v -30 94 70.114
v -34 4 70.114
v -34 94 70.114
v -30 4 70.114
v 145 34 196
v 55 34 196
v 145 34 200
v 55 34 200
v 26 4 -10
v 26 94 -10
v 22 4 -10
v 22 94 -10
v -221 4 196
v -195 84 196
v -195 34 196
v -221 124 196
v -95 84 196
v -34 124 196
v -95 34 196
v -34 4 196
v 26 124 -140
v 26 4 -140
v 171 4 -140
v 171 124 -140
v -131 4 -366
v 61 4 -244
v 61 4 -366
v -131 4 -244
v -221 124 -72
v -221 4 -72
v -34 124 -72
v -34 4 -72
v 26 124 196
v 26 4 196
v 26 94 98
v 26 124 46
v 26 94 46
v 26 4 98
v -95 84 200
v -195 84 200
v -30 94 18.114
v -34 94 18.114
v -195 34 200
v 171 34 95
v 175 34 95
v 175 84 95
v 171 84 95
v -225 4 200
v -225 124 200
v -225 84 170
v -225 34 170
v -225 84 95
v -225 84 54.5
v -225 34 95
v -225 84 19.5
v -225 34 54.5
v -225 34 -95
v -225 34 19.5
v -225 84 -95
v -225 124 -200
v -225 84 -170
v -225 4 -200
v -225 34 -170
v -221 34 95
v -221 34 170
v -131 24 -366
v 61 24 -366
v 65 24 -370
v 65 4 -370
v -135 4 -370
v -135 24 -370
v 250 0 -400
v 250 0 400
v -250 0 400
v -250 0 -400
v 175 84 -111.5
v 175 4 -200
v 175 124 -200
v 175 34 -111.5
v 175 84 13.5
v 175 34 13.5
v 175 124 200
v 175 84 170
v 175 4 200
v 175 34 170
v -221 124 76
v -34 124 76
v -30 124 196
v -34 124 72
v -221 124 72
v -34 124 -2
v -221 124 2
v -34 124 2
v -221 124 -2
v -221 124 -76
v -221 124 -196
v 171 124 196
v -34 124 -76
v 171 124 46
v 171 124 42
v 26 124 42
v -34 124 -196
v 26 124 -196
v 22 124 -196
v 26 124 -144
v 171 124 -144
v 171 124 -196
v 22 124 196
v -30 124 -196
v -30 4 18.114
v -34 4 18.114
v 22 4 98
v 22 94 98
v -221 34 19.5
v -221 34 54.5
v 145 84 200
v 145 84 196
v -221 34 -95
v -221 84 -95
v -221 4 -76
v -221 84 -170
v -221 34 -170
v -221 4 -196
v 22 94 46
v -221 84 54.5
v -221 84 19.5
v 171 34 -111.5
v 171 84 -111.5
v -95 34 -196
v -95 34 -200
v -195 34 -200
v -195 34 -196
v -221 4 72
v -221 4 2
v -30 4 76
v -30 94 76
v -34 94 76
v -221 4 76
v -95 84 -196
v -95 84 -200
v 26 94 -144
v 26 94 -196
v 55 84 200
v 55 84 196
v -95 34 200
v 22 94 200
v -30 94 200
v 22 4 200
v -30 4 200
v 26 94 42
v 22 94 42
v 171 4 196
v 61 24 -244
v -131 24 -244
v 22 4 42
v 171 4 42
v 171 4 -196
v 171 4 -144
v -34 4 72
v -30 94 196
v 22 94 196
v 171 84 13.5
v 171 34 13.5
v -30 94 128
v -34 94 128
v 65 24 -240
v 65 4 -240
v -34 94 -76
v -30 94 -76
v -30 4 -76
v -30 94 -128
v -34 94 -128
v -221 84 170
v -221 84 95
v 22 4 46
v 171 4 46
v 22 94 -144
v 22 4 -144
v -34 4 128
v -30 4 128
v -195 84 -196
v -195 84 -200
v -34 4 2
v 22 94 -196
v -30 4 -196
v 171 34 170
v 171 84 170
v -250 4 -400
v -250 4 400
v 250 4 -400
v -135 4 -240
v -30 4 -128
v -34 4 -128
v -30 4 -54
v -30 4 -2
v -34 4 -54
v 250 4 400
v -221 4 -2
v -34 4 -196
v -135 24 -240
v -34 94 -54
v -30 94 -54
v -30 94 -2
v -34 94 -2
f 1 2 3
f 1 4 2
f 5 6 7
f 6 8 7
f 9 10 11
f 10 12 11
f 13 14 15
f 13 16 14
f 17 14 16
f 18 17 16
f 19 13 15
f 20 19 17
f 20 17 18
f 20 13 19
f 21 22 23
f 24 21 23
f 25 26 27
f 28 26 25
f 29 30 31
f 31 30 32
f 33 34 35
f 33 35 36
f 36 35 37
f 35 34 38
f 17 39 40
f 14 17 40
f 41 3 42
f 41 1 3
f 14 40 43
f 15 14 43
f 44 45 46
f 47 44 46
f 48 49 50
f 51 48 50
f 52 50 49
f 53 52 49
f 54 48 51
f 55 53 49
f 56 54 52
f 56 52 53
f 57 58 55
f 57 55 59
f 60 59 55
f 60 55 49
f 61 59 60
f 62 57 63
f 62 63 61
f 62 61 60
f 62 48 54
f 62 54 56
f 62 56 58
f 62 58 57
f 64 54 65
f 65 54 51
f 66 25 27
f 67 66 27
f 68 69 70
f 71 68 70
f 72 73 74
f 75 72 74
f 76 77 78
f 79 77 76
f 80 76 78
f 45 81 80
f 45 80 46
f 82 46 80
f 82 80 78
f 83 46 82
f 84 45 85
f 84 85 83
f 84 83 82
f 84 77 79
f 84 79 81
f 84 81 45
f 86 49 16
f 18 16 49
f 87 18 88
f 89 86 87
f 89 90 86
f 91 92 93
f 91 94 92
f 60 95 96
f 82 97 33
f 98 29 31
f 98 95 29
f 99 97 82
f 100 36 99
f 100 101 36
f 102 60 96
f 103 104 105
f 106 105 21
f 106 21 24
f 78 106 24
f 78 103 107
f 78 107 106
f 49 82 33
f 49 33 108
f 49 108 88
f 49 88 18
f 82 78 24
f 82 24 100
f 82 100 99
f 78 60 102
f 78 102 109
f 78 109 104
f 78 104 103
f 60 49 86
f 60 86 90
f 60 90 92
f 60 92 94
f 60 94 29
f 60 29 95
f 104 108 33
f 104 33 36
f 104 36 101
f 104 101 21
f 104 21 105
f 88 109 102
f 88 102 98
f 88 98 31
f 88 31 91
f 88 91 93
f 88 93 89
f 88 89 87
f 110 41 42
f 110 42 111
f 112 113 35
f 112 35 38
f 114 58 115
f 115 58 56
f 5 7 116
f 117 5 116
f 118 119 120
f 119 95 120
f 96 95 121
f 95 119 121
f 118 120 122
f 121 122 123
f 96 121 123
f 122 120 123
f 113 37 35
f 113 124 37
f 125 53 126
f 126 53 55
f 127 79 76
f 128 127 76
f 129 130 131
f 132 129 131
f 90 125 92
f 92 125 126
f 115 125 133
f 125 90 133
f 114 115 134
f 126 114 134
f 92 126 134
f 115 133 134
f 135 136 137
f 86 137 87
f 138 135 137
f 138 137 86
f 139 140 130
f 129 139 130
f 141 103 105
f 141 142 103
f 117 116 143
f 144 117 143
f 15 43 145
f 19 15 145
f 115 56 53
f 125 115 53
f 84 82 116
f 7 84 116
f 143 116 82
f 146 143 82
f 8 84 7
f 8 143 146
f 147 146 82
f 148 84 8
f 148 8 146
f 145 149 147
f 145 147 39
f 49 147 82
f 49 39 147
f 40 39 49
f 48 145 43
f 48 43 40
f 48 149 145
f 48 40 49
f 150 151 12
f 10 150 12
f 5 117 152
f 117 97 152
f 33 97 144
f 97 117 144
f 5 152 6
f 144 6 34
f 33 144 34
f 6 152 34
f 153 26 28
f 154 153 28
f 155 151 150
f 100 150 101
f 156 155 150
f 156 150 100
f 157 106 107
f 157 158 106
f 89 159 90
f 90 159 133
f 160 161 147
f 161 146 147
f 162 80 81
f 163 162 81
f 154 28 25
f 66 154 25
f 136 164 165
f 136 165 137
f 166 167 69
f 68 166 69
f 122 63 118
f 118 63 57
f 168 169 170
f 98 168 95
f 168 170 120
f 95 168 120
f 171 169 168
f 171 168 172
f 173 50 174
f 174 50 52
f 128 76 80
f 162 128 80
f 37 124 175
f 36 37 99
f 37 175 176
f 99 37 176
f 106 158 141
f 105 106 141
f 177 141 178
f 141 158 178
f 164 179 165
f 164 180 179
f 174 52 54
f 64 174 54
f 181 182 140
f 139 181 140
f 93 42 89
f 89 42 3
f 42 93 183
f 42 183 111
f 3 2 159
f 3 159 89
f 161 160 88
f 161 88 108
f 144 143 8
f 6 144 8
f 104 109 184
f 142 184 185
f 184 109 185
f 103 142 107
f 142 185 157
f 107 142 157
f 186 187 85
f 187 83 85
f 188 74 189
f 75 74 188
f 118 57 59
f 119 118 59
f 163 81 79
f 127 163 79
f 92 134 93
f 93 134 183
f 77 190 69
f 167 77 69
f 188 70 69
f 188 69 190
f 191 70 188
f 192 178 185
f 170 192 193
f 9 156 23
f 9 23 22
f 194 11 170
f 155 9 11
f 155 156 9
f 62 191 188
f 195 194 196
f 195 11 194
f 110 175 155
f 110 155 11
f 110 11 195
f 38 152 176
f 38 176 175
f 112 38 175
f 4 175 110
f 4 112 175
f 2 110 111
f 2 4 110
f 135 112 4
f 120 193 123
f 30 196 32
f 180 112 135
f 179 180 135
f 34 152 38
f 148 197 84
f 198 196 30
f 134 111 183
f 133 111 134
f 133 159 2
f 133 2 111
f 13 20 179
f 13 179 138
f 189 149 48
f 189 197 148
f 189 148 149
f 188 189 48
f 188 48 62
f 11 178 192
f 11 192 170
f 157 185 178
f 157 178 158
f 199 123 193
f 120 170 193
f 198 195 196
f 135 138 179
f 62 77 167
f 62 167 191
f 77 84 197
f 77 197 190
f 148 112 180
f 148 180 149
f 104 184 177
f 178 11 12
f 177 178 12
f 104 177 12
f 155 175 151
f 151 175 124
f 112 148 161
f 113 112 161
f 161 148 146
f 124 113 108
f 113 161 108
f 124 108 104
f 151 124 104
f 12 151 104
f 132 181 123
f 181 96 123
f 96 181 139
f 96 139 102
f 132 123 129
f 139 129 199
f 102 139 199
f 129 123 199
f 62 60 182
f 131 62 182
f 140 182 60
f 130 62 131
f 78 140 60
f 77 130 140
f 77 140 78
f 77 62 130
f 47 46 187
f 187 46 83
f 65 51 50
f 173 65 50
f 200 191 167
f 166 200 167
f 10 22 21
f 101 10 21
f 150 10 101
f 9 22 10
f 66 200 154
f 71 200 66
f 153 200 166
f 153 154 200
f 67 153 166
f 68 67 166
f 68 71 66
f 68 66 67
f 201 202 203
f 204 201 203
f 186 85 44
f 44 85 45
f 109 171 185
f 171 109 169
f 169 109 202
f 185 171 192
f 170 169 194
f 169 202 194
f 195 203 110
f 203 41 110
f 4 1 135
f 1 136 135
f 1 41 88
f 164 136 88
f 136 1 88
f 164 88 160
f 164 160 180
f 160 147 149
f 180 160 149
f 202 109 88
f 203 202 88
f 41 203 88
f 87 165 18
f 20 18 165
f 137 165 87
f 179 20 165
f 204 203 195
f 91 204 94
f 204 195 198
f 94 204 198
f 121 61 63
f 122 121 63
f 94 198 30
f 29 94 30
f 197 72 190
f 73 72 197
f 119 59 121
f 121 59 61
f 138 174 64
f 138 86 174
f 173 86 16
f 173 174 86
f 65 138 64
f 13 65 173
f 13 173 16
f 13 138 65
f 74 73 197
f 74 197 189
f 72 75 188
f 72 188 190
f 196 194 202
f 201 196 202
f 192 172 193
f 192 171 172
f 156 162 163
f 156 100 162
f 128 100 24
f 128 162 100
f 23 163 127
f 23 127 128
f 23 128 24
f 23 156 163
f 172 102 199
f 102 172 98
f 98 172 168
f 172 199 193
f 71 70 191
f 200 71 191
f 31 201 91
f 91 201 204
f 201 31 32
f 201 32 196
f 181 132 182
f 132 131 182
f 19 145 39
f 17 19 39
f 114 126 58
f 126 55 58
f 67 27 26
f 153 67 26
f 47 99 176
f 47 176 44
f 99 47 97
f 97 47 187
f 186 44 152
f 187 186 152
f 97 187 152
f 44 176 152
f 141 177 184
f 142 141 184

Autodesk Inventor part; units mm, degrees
ref_plane "YZ Plane" through (0, 0, 0) normal (1, 0, 0) x (0, 1, 0)
sketch "Boceto1" plane through (0, 0, 0) normal (0, 1, 0) x (-1, 0, 0)
  line L0 (-250, 400) -> (250, 400)
  line L1 (250, 400) -> (250, -400)
  line L2 (250, -400) -> (-250, -400)
  line L3 (-250, -400) -> (-250, 400)
  line L4 (-250, 400) -> (250, -400) construction
  line L5 (250, 400) -> (-250, -400) construction
  line L6 (-175, 200) -> (225, 200)
  line L7 (225, 200) -> (225, -200)
  line L8 (225, -200) -> (-175, -200)
  line L9 (-175, -200) -> (-175, 200)
  line L10 (-175, 200) -> (225, -200) construction
  line L11 (225, 200) -> (-175, -200) construction
  point P0 (0, 0)
  point P1 (25, 0)
  dimension "d0" = 500
  dimension "d1" = 800
  dimension "d4" = 400
  dimension "d5" = 400
  dimension "d6" = 200
  dimension "d7" = 75
extrude "Extrusión1" add sketch "Boceto1" along normal blind 4 contours L0 L1 L2 L3 | L6 L7 L8 L9
sketch "Boceto2" plane through (0, 4, 0) normal (0, 1, 0) x (1, 0, 0)
  line L0 (175, -200) -> (-225, -200)
  line L1 (-225, -200) -> (-225, 200)
  line L2 (-225, 200) -> (175, 200)
  line L3 (175, 200) -> (175, -200)
  line L4 (175, -200) -> (-225, 200) construction
  line L5 (-225, -200) -> (175, 200) construction
  line L6 (250, -400) -> (250, 400) projected
  line L7 (250, 400) -> (-250, 400) projected
  line L8 (-221, -196) -> (-34, -196)
  line L9 (-34, -196) -> (-34, -76)
  line L10 (-34, -76) -> (-221, -76)
  line L11 (-221, -76) -> (-221, -196)
  line L12 (171, -196) -> (26, -196)
  line L13 (26, -196) -> (26, -46)
  line L14 (26, -46) -> (171, -46)
  line L15 (171, -46) -> (171, -196)
  line L16 (171, 196) -> (26, 196)
  line L17 (26, 196) -> (26, -42)
  line L18 (26, -42) -> (171, -42)
  line L19 (171, -42) -> (171, 196)
  line L20 (-34, -72) -> (-221, -72)
  line L21 (-221, -72) -> (-221, 72)
  line L22 (-221, 72) -> (-34, 72)
  line L23 (-34, 72) -> (-34, -72)
  line L24 (-34, 76) -> (-221, 76)
  line L25 (-221, 76) -> (-221, 196)
  line L26 (-221, 196) -> (-34, 196)
  line L27 (-34, 196) -> (-34, 76)
  line L28 (-30, 196) -> (22, 196)
  line L29 (22, 196) -> (22, 122)
  line L30 (-30, 122) -> (-30, 196)
  line L31 (-34, 0) -> (-34, -2)
  line L32 (-34, -2) -> (-34, 2)
  line L33 (-34, 2) -> (-221, 2)
  line L34 (-221, -2) -> (-34, -2)
  line L35 (-30, -200) -> (-30, 122)
  line L36 (22, 122) -> (22, -200)
  line L37 (-30, -196) -> (22, -196)
  line L38 (26, 196) -> (26, 144)
  line L39 (26, 144) -> (26, 140)
  line L40 (26, 140) -> (171, 140)
  line L41 (171, 144) -> (26, 144)
  point P0 (0, 0)
  point P1 (-25, 0)
  point P2 (-30, 126)
  point P3 (22, 126)
  dimension "d8" = 400
  dimension "d9" = 400
  dimension "d10" = 75
  dimension "d11" = 200
  dimension "d12" = 4
  dimension "d13" = 4
  dimension "d14" = 4
  dimension "d15" = 4
  dimension "d16" = 4
  dimension "d17" = 60
  dimension "d18" = 145
  dimension "d19" = 150
  dimension "d20" = 120
  dimension "d21" = 120
  dimension "d22" = 4
  dimension "d23" = 4
  dimension "d24" = 2
  dimension "d25" = 4
  dimension "d27" = 4
  dimension "d39" = 52
  dimension "d40" = 4
ref_plane "Plano de trabajo1" through (-225, 4, 200) normal (0, 0, 1) x (1, 0, 0)
sketch "Boceto3" plane through (-225, 4, 200) normal (0, 0, 1) x (1, 0, 0)
  line L0 (195, 0) -> (195, 120) projected
  line L1 (247, 0) -> (247, 120) projected
  line L2 (195, 0) -> (247, 0)
  line L3 (247, 0) -> (247, 90)
  line L4 (247, 90) -> (195, 90)
  line L5 (195, 90) -> (195, 0)
  point P0 (225, -4)
  dimension "d31" = 90
extrude "Extrusión3" cut sketch "Boceto3" against normal blind 120
ref_plane "Plano de trabajo2" through (-30, 4, 200) normal (1, 0, 0) x (0, 0, -1)
sketch "Boceto4" plane through (-30, 4, 200) normal (1, 0, 0) x (0, 0, -1)
  line L0 (124, 0) -> (124, 120) projected
  line L1 (124, 0) -> (72, 0)
  line L2 (72, 0) -> (72, 90)
  line L3 (72, 90) -> (124, 90)
  line L4 (124, 90) -> (124, 0)
  line L5 (0, 0) -> (400, 0) projected
  line L6 (129.886, 90) -> (181.886, 90)
  line L7 (181.886, 90) -> (181.886, 0)
  line L8 (181.886, 0) -> (129.886, 0)
  line L9 (129.886, 0) -> (129.886, 90)
  line L10 (202, 0) -> (202, 120) projected
  line L11 (202, 0) -> (254, 0)
  line L12 (254, 0) -> (254, 90)
  line L13 (254, 90) -> (202, 90)
  line L14 (202, 90) -> (202, 0)
  line L15 (276, 0) -> (276, 120) projected
  line L16 (396, 0) -> (276, 0) projected
  line L17 (276, 90) -> (328, 90)
  line L18 (328, 90) -> (328, 0)
  line L19 (328, 0) -> (276, 0)
  line L20 (276, 0) -> (276, 90)
  point P0 (200, -4)
  dimension "d34" = 52
  dimension "d35" = 90
  dimension "d36" = 52
  dimension "d37" = 52
  dimension "d38" = 52
extrude "Extrusión4" add sketch "Boceto2" along normal blind 120 contours L0 L36 L29 L28 L30 L35 L1 L2 L3 | L0 L35 L37 L36 | L19 L40 L17 L41 | L34 L21 L33 L23
extrude "Extrusión5" cut sketch "Boceto4" against normal blind 120
sketch "Boceto5" plane through (22, 4, -196) normal (-1, 0, 0) x (0, 0, 1)
  line L0 (596, 0) -> (-204, 0) projected
  line L1 (0, 0) -> (52, 0)
  line L2 (52, 0) -> (52, 90)
  line L3 (52, 90) -> (0, 90)
  line L4 (0, 90) -> (0, 0)
  line L5 (238, 0) -> (238, 120) projected
  line L6 (238, 90) -> (186, 90)
  line L7 (186, 90) -> (186, 0)
  line L8 (186, 0) -> (238, 0)
  line L9 (238, 0) -> (238, 90)
  line L10 (242, 0) -> (242, 120) projected
  line L11 (242, 0) -> (392, 0) projected
  line L12 (242, 90) -> (294, 90)
  line L13 (294, 90) -> (294, 0)
  line L14 (294, 0) -> (242, 0)
  line L15 (242, 0) -> (242, 90)
  line L16 (0, 0) -> (0, 120) projected
  point P0 (196, -4)
  dimension "d45" = 52
  dimension "d46" = 90
  dimension "d47" = 52
  dimension "d48" = 52
  dimension "d108" = 0
extrude "Extrusión6" cut sketch "Boceto5" against normal blind 120
sketch "Boceto6" plane through (-225, 4, 200) normal (0, 0, 1) x (1, 0, 0)
  line L0 (195, 0) -> (247, 0) projected
  line L1 (247, 0) -> (247, 120) projected
  line L2 (195, 0) -> (247, 0)
  line L3 (247, 0) -> (247, 90)
  line L4 (247, 90) -> (195, 90)
  line L5 (195, 90) -> (195, 0)
  point P0 (225, -4)
  dimension "d51" = 90
extrude "Extrusión7" cut sketch "Boceto6" against normal blind 120
sketch "Boceto7" plane through (0, 4, 0) normal (0, 1, 0) x (1, 0, 0)
  line L0 (-135, 240) -> (65, 240)
  line L1 (65, 240) -> (65, 370)
  line L2 (65, 370) -> (-135, 370)
  line L3 (-135, 370) -> (-135, 240)
  line L4 (175, 200) -> (-225, 200) projected
  line L5 (-250, 400) -> (-250, -400) projected
  line L6 (61, 244) -> (-131, 244)
  line L7 (-131, 244) -> (-131, 366)
  line L8 (-131, 366) -> (61, 366)
  line L9 (61, 366) -> (61, 244)
  line L10 (61, 244) -> (-131, 366) construction
  line L11 (-131, 244) -> (61, 366) construction
  point P0 (0, 0)
  point P1 (-35, 305)
  dimension "d54" = 200
  dimension "d55" = 130
  dimension "d56" = 40
  dimension "d57" = 115
  dimension "d58" = 192
  dimension "d59" = 122
  dimension "d60" = 4
  dimension "d61" = 4
extrude "Extrusión8" add sketch "Boceto7" along normal blind 20
sketch "Boceto8" plane through (-225, 4, 200) normal (0, 0, 1) x (1, 0, 0)
  line L0 (30, 30) -> (130, 30)
  line L1 (130, 30) -> (130, 80)
  line L2 (130, 80) -> (30, 80)
  line L3 (30, 80) -> (30, 30)
  line L4 (30, 30) -> (130, 80) construction
  line L5 (130, 30) -> (30, 80) construction
  line L6 (195, 0) -> (0, 0) projected
  line L7 (0, 0) -> (0, 120) projected
  point P0 (225, -4)
  point P1 (80, 55)
  dimension "d64" = 100
  dimension "d65" = 50
  dimension "d66" = 30
  dimension "d67" = 30
extrude "Extrusión9" cut sketch "Boceto8" against normal blind 10
sketch "Boceto9" plane through (-225, 4, -200) normal (-1, 0, 0) x (0, 0, 1)
  line L0 (295, 30) -> (370, 30)
  line L1 (370, 30) -> (370, 80)
  line L2 (370, 80) -> (295, 80)
  line L3 (295, 80) -> (295, 30)
  line L4 (295, 30) -> (370, 80) construction
  line L5 (370, 30) -> (295, 80) construction
  line L6 (400, 0) -> (400, 120) projected
  line L7 (400, 0) -> (0, 0) projected
  point P0 (200, -4)
  point P1 (332.5, 55)
  dimension "d70" = 75
  dimension "d71" = 50
  dimension "d72" = 30
  dimension "d73" = 30
extrude "Extrusión10" cut sketch "Boceto9" against normal blind 10
sketch "Boceto10" plane through (-225, 4, -200) normal (-1, 0, 0) x (0, 0, 1)
  line L0 (30, 30) -> (105, 30)
  line L1 (105, 30) -> (105, 80)
  line L2 (105, 80) -> (30, 80)
  line L3 (30, 80) -> (30, 30)
  line L4 (30, 30) -> (105, 80) construction
  line L5 (105, 30) -> (30, 80) construction
  line L6 (0, 0) -> (0, 120) projected
  line L7 (-200, 0) -> (600, 0) projected
  line L8 (219.5, 30) -> (254.5, 30)
  line L9 (254.5, 30) -> (254.5, 80)
  line L10 (254.5, 80) -> (219.5, 80)
  line L11 (219.5, 80) -> (219.5, 30)
  line L12 (219.5, 30) -> (254.5, 80) construction
  line L13 (254.5, 30) -> (219.5, 80) construction
  line L14 (272, 0) -> (272, 120) projected
  point P0 (200, -4)
  point P1 (67.5, 55)
  point P2 (237, 55)
  dimension "d76" = 75
  dimension "d77" = 50
  dimension "d78" = 30
  dimension "d79" = 30
  dimension "d80" = 35
  dimension "d81" = 50
  dimension "d82" = 30
  dimension "d83" = 17.5
extrude "Extrusión11" cut sketch "Boceto10" against normal blind 10
sketch "Boceto11" plane through (-225, 4, 200) normal (0, 0, 1) x (1, 0, 0)
  line L0 (280, 30) -> (370, 30)
  line L1 (370, 30) -> (370, 80)
  line L2 (370, 80) -> (280, 80)
  line L3 (280, 80) -> (280, 30)
  line L4 (280, 30) -> (370, 80) construction
  line L5 (370, 30) -> (280, 80) construction
  line L6 (-25, 0) -> (475, 0) projected
  line L7 (400, 0) -> (400, 120) projected
  point P0 (225, -4)
  point P1 (325, 55)
  dimension "d86" = 90
  dimension "d88" = 30
  dimension "d89" = 50
  dimension "d90" = 30
extrude "Extrusión12" cut sketch "Boceto11" against normal blind 10
sketch "Boceto12" plane through (175, 4, -200) normal (0, 0, -1) x (-1, 0, 0)
  line L0 (270, 30) -> (370, 30)
  line L1 (370, 30) -> (370, 80)
  line L2 (370, 80) -> (270, 80)
  line L3 (270, 80) -> (270, 30)
  line L4 (270, 30) -> (370, 80) construction
  line L5 (370, 30) -> (270, 80) construction
  line L6 (400, 0) -> (400, 120) projected
  line L7 (-75, 0) -> (425, 0) projected
  point P0 (175, -4)
  point P1 (320, 55)
  dimension "d93" = 100
  dimension "d94" = 50
  dimension "d95" = 30
  dimension "d96" = 30
extrude "Extrusión13" cut sketch "Boceto12" against normal blind 10
sketch "Boceto13" plane through (175, 4, 200) normal (1, 0, 0) x (0, 0, -1)
  line L0 (30, 30) -> (105, 30) projected
  line L1 (105, 80) -> (30, 80) projected
  line L2 (30, 30) -> (105, 30)
  line L3 (105, 30) -> (105, 80)
  line L4 (105, 80) -> (30, 80)
  line L5 (30, 80) -> (30, 30)
  point P0 (200, -4)
extrude "Extrusión14" cut sketch "Boceto13" against normal blind 10
sketch "Boceto14" plane through (175, 4, 200) normal (1, 0, 0) x (0, 0, -1)
  line L0 (186.5, 30) -> (311.5, 30)
  line L1 (311.5, 30) -> (311.5, 80)
  line L2 (311.5, 80) -> (186.5, 80)
  line L3 (186.5, 80) -> (186.5, 30)
  line L4 (186.5, 30) -> (311.5, 80) construction
  line L5 (311.5, 30) -> (186.5, 80) construction
  line L6 (-200, 0) -> (600, 0) projected
  line L7 (158, 0) -> (158, 120) projected
  point P0 (200, -4)
  point P1 (249, 55)
  dimension "d101" = 125
  dimension "d102" = 50
  dimension "d103" = 30
  dimension "d105" = 91
extrude "Extrusión15" cut sketch "Boceto14" against normal blind 10
properties part number "maqueta casa"
